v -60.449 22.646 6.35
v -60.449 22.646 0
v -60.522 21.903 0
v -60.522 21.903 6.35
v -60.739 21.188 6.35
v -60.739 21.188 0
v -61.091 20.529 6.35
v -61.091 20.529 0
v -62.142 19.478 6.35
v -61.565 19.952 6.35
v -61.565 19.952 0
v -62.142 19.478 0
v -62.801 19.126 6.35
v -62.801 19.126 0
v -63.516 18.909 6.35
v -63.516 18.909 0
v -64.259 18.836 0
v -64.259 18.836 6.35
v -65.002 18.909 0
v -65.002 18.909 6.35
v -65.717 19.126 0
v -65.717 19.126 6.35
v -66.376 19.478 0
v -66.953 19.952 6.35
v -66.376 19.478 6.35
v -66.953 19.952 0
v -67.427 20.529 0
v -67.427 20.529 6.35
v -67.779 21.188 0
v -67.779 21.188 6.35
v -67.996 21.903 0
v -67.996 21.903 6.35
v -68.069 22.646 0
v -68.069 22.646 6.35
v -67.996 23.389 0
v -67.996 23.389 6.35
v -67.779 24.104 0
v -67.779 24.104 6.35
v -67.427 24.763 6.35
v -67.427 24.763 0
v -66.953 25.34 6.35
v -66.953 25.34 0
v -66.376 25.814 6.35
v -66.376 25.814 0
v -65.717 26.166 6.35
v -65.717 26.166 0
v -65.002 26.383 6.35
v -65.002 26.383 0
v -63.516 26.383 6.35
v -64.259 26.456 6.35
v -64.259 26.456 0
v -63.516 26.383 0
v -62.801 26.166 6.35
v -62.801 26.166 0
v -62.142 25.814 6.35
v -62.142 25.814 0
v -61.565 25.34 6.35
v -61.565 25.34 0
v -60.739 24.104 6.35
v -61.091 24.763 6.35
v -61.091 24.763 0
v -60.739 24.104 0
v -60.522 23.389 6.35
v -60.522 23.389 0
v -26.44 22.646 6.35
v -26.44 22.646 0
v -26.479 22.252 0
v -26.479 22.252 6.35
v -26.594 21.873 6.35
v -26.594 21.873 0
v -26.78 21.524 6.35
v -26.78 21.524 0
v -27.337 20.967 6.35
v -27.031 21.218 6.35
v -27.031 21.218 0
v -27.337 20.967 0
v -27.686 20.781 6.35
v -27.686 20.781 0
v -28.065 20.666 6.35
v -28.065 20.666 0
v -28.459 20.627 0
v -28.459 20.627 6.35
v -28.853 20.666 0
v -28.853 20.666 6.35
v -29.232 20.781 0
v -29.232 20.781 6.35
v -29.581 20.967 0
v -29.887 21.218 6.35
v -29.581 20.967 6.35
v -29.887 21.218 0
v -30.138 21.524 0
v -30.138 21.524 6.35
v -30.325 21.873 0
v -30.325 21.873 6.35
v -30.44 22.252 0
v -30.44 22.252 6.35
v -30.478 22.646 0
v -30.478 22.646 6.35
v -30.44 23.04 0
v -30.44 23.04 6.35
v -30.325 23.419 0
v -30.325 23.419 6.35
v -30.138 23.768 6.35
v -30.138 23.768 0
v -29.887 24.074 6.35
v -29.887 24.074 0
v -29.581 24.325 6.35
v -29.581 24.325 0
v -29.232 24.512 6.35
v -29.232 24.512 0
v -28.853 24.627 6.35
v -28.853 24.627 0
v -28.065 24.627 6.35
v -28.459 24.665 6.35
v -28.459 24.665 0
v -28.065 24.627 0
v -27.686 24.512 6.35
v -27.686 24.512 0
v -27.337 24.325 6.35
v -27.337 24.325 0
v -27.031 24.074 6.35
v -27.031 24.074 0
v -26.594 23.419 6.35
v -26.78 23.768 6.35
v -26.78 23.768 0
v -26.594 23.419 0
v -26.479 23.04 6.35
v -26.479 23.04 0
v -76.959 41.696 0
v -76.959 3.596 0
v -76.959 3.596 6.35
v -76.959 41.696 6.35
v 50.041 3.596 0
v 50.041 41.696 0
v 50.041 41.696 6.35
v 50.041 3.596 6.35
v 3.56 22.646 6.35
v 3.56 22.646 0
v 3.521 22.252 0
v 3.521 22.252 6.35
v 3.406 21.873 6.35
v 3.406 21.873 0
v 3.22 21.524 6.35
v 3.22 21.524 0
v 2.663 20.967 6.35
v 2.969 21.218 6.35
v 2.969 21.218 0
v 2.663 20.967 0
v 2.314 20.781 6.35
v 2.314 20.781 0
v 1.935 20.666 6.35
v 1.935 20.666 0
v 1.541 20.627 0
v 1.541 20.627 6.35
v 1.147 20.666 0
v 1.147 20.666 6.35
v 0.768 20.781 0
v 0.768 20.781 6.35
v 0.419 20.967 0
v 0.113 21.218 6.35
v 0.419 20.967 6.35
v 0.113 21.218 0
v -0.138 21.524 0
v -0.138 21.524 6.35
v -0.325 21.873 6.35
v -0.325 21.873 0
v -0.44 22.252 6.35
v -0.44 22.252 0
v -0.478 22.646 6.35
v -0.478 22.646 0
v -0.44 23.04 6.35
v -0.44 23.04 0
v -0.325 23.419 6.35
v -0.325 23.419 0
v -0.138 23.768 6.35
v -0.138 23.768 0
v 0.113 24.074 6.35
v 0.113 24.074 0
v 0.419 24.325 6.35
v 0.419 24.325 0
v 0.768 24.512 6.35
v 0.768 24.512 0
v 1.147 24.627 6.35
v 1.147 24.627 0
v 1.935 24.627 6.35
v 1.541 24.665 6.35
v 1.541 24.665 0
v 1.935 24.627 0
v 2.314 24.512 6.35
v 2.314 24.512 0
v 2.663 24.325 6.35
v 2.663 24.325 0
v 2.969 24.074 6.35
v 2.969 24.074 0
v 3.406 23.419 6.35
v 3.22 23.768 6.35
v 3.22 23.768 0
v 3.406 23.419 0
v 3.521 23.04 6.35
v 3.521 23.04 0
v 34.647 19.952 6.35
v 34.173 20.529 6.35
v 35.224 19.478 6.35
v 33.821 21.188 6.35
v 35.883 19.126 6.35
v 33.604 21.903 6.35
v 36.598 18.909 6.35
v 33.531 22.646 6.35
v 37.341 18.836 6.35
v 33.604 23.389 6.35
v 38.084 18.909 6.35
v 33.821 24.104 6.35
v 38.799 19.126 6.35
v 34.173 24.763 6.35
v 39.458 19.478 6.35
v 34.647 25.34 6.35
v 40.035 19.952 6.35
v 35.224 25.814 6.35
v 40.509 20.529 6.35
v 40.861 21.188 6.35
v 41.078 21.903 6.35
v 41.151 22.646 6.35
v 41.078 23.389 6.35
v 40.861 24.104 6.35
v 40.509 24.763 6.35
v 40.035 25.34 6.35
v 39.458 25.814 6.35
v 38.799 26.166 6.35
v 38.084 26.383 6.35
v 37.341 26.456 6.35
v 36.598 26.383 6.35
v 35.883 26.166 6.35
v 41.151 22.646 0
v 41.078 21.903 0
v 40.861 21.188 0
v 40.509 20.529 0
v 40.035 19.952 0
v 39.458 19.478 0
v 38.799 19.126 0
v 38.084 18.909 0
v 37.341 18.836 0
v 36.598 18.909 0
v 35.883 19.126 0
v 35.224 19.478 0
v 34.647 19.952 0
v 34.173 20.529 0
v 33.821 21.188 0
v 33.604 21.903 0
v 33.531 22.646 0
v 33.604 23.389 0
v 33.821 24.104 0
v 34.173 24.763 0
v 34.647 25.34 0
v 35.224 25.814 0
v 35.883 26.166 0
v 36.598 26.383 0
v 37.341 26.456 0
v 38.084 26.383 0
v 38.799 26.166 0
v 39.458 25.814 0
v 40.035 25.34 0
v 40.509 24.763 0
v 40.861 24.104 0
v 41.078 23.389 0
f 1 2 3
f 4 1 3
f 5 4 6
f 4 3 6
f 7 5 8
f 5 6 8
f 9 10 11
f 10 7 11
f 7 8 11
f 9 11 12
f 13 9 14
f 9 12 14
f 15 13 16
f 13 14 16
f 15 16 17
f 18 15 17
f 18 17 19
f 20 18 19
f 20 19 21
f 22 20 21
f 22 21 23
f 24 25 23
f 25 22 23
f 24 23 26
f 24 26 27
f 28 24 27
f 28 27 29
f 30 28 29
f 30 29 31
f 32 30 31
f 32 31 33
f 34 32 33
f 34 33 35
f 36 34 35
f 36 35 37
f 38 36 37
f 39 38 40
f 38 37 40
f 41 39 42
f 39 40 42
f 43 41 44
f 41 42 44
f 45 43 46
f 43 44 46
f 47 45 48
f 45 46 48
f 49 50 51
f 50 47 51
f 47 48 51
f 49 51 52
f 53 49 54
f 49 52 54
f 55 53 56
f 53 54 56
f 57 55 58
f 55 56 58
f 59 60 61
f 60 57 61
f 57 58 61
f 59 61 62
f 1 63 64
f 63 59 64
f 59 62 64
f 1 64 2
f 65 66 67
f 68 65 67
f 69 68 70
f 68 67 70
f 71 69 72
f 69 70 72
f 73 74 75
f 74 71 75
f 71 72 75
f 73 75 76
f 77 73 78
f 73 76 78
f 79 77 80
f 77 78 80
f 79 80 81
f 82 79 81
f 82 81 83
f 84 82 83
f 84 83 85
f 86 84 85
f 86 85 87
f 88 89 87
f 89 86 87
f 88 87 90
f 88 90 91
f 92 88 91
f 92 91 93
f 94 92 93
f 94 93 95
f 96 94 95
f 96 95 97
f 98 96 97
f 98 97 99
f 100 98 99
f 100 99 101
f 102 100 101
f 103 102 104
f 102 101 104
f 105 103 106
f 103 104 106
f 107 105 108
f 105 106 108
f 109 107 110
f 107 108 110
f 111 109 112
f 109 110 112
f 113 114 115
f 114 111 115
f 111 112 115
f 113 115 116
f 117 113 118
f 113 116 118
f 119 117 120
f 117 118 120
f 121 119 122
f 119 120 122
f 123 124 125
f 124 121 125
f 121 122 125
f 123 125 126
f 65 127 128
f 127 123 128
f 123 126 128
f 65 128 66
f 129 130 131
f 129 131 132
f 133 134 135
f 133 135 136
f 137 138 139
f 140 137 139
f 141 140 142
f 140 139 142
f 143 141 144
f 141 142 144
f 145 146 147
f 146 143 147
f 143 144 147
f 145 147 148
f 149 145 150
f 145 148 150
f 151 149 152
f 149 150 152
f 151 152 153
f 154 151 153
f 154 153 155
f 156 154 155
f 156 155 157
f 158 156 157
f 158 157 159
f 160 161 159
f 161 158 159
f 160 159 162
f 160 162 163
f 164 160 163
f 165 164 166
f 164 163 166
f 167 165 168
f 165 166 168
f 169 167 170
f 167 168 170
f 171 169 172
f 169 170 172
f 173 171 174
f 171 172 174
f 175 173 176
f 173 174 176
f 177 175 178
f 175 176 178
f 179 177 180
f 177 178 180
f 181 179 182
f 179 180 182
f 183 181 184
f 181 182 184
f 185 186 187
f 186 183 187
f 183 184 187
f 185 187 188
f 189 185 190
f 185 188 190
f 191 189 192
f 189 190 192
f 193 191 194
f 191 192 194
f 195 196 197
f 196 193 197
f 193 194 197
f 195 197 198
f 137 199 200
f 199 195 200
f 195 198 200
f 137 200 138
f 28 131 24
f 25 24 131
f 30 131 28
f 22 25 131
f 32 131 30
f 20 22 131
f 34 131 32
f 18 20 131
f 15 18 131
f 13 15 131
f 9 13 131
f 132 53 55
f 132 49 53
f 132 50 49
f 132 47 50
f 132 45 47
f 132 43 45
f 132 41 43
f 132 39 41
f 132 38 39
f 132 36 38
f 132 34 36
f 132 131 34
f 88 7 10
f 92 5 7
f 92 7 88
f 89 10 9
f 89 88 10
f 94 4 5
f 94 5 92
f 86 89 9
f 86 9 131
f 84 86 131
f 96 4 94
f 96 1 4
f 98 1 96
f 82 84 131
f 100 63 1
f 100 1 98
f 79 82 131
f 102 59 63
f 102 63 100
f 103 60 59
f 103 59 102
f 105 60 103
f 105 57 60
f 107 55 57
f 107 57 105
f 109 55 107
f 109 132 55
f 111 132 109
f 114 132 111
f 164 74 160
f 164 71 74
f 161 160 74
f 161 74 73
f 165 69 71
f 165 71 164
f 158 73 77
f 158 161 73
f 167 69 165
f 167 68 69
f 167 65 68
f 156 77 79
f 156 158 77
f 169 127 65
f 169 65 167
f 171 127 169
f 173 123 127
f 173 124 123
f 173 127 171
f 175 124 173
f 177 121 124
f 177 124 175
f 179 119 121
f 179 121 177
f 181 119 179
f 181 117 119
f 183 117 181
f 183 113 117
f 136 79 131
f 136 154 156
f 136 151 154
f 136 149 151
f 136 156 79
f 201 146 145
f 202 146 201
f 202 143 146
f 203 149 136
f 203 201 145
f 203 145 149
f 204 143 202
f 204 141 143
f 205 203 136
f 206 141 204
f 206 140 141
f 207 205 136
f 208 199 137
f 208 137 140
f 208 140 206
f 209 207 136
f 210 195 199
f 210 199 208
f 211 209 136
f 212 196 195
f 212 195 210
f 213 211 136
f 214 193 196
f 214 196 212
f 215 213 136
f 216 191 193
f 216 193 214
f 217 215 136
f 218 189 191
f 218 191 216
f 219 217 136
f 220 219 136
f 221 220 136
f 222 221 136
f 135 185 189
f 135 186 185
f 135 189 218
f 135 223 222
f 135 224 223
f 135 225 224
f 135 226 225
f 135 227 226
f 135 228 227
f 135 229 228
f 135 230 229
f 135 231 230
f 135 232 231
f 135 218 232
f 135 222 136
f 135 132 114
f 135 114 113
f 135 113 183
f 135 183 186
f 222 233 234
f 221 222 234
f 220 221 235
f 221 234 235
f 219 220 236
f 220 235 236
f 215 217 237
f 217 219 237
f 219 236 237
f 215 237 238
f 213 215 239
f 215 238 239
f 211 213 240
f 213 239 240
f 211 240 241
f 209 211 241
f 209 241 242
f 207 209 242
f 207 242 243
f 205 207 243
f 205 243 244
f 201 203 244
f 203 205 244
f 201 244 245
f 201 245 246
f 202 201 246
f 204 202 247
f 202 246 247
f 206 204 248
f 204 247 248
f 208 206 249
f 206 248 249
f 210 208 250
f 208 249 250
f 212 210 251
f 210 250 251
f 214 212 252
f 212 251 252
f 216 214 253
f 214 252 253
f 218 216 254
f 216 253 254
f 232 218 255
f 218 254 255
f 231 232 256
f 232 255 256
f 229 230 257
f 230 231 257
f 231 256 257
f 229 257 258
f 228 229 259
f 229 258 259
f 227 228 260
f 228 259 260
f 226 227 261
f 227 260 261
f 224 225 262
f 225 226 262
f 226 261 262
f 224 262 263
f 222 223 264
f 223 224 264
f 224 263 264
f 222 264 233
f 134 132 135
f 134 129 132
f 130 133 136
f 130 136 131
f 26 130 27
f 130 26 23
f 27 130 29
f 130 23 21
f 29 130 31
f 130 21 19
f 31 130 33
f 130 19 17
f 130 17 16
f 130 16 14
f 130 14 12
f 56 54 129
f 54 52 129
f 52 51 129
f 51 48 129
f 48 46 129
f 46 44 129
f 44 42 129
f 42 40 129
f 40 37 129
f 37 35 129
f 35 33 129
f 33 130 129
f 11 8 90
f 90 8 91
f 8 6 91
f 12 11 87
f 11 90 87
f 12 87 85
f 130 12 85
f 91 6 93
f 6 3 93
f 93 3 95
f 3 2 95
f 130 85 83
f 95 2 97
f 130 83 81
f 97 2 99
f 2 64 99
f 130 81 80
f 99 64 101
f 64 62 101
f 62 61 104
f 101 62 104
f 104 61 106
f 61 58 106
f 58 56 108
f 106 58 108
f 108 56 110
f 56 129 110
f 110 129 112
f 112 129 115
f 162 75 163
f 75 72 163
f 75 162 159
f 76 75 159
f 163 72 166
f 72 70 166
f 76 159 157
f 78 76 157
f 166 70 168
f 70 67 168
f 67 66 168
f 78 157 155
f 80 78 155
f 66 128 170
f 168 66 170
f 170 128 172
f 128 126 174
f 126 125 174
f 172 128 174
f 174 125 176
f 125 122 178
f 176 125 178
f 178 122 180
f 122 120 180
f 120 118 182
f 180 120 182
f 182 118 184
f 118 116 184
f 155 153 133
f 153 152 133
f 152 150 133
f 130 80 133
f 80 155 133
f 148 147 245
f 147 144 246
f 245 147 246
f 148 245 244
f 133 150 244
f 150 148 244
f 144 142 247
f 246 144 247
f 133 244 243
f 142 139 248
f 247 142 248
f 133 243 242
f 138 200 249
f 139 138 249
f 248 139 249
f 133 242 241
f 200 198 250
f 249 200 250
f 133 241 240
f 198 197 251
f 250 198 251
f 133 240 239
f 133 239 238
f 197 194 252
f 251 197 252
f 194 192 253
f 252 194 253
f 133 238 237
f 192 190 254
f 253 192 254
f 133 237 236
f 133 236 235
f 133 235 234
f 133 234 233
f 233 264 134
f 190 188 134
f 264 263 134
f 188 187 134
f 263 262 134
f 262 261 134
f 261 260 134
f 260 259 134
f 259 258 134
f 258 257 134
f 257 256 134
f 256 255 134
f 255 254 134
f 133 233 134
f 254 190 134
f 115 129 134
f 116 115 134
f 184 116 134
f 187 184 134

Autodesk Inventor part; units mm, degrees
ref_plane "YZ Plane" through (0, 0, 0) normal (1, 0, 0) x (0, 1, 0)
ref_plane "XZ Plane" through (0, 0, 0) normal (0, 1, 0) x (-1, 0, 0)
ref_plane "XY Plane" through (0, 0, 0) normal (0, 0, 1) x (1, 0, 0)
sketch "Sketch1" plane through (0, 0, 0) normal (0, 0, 1) x (1, 0, 0)
  line L0 (-76.9591, 41.6961) -> (50.0409, 41.6961)
  line L1 (50.0409, 41.6961) -> (50.0409, 3.5961)
  line L2 (50.0409, 3.5961) -> (-76.9591, 3.5961)
  line L3 (-76.9591, 3.5961) -> (-76.9591, 41.6961)
  circle A0 centre (-28.4591, 22.6461) radius 2.0193
  circle A1 centre (1.5409, 22.6461) radius 2.0193
  circle A2 centre (-64.2591, 22.6461) radius 3.81
  circle A3 centre (37.3409, 22.6461) radius 3.81
  point P0 (0, 0)
  dimension "d0" = 127
  dimension "d1" = 38.1
  dimension "d4" = 4.0386
  dimension "d5" = 4.0386
  dimension "d8" = 7.62
  dimension "d9" = 7.62
extrude "Extrusion1" add sketch "Sketch1" along normal blind 6.35
properties part number "z axis mount"
